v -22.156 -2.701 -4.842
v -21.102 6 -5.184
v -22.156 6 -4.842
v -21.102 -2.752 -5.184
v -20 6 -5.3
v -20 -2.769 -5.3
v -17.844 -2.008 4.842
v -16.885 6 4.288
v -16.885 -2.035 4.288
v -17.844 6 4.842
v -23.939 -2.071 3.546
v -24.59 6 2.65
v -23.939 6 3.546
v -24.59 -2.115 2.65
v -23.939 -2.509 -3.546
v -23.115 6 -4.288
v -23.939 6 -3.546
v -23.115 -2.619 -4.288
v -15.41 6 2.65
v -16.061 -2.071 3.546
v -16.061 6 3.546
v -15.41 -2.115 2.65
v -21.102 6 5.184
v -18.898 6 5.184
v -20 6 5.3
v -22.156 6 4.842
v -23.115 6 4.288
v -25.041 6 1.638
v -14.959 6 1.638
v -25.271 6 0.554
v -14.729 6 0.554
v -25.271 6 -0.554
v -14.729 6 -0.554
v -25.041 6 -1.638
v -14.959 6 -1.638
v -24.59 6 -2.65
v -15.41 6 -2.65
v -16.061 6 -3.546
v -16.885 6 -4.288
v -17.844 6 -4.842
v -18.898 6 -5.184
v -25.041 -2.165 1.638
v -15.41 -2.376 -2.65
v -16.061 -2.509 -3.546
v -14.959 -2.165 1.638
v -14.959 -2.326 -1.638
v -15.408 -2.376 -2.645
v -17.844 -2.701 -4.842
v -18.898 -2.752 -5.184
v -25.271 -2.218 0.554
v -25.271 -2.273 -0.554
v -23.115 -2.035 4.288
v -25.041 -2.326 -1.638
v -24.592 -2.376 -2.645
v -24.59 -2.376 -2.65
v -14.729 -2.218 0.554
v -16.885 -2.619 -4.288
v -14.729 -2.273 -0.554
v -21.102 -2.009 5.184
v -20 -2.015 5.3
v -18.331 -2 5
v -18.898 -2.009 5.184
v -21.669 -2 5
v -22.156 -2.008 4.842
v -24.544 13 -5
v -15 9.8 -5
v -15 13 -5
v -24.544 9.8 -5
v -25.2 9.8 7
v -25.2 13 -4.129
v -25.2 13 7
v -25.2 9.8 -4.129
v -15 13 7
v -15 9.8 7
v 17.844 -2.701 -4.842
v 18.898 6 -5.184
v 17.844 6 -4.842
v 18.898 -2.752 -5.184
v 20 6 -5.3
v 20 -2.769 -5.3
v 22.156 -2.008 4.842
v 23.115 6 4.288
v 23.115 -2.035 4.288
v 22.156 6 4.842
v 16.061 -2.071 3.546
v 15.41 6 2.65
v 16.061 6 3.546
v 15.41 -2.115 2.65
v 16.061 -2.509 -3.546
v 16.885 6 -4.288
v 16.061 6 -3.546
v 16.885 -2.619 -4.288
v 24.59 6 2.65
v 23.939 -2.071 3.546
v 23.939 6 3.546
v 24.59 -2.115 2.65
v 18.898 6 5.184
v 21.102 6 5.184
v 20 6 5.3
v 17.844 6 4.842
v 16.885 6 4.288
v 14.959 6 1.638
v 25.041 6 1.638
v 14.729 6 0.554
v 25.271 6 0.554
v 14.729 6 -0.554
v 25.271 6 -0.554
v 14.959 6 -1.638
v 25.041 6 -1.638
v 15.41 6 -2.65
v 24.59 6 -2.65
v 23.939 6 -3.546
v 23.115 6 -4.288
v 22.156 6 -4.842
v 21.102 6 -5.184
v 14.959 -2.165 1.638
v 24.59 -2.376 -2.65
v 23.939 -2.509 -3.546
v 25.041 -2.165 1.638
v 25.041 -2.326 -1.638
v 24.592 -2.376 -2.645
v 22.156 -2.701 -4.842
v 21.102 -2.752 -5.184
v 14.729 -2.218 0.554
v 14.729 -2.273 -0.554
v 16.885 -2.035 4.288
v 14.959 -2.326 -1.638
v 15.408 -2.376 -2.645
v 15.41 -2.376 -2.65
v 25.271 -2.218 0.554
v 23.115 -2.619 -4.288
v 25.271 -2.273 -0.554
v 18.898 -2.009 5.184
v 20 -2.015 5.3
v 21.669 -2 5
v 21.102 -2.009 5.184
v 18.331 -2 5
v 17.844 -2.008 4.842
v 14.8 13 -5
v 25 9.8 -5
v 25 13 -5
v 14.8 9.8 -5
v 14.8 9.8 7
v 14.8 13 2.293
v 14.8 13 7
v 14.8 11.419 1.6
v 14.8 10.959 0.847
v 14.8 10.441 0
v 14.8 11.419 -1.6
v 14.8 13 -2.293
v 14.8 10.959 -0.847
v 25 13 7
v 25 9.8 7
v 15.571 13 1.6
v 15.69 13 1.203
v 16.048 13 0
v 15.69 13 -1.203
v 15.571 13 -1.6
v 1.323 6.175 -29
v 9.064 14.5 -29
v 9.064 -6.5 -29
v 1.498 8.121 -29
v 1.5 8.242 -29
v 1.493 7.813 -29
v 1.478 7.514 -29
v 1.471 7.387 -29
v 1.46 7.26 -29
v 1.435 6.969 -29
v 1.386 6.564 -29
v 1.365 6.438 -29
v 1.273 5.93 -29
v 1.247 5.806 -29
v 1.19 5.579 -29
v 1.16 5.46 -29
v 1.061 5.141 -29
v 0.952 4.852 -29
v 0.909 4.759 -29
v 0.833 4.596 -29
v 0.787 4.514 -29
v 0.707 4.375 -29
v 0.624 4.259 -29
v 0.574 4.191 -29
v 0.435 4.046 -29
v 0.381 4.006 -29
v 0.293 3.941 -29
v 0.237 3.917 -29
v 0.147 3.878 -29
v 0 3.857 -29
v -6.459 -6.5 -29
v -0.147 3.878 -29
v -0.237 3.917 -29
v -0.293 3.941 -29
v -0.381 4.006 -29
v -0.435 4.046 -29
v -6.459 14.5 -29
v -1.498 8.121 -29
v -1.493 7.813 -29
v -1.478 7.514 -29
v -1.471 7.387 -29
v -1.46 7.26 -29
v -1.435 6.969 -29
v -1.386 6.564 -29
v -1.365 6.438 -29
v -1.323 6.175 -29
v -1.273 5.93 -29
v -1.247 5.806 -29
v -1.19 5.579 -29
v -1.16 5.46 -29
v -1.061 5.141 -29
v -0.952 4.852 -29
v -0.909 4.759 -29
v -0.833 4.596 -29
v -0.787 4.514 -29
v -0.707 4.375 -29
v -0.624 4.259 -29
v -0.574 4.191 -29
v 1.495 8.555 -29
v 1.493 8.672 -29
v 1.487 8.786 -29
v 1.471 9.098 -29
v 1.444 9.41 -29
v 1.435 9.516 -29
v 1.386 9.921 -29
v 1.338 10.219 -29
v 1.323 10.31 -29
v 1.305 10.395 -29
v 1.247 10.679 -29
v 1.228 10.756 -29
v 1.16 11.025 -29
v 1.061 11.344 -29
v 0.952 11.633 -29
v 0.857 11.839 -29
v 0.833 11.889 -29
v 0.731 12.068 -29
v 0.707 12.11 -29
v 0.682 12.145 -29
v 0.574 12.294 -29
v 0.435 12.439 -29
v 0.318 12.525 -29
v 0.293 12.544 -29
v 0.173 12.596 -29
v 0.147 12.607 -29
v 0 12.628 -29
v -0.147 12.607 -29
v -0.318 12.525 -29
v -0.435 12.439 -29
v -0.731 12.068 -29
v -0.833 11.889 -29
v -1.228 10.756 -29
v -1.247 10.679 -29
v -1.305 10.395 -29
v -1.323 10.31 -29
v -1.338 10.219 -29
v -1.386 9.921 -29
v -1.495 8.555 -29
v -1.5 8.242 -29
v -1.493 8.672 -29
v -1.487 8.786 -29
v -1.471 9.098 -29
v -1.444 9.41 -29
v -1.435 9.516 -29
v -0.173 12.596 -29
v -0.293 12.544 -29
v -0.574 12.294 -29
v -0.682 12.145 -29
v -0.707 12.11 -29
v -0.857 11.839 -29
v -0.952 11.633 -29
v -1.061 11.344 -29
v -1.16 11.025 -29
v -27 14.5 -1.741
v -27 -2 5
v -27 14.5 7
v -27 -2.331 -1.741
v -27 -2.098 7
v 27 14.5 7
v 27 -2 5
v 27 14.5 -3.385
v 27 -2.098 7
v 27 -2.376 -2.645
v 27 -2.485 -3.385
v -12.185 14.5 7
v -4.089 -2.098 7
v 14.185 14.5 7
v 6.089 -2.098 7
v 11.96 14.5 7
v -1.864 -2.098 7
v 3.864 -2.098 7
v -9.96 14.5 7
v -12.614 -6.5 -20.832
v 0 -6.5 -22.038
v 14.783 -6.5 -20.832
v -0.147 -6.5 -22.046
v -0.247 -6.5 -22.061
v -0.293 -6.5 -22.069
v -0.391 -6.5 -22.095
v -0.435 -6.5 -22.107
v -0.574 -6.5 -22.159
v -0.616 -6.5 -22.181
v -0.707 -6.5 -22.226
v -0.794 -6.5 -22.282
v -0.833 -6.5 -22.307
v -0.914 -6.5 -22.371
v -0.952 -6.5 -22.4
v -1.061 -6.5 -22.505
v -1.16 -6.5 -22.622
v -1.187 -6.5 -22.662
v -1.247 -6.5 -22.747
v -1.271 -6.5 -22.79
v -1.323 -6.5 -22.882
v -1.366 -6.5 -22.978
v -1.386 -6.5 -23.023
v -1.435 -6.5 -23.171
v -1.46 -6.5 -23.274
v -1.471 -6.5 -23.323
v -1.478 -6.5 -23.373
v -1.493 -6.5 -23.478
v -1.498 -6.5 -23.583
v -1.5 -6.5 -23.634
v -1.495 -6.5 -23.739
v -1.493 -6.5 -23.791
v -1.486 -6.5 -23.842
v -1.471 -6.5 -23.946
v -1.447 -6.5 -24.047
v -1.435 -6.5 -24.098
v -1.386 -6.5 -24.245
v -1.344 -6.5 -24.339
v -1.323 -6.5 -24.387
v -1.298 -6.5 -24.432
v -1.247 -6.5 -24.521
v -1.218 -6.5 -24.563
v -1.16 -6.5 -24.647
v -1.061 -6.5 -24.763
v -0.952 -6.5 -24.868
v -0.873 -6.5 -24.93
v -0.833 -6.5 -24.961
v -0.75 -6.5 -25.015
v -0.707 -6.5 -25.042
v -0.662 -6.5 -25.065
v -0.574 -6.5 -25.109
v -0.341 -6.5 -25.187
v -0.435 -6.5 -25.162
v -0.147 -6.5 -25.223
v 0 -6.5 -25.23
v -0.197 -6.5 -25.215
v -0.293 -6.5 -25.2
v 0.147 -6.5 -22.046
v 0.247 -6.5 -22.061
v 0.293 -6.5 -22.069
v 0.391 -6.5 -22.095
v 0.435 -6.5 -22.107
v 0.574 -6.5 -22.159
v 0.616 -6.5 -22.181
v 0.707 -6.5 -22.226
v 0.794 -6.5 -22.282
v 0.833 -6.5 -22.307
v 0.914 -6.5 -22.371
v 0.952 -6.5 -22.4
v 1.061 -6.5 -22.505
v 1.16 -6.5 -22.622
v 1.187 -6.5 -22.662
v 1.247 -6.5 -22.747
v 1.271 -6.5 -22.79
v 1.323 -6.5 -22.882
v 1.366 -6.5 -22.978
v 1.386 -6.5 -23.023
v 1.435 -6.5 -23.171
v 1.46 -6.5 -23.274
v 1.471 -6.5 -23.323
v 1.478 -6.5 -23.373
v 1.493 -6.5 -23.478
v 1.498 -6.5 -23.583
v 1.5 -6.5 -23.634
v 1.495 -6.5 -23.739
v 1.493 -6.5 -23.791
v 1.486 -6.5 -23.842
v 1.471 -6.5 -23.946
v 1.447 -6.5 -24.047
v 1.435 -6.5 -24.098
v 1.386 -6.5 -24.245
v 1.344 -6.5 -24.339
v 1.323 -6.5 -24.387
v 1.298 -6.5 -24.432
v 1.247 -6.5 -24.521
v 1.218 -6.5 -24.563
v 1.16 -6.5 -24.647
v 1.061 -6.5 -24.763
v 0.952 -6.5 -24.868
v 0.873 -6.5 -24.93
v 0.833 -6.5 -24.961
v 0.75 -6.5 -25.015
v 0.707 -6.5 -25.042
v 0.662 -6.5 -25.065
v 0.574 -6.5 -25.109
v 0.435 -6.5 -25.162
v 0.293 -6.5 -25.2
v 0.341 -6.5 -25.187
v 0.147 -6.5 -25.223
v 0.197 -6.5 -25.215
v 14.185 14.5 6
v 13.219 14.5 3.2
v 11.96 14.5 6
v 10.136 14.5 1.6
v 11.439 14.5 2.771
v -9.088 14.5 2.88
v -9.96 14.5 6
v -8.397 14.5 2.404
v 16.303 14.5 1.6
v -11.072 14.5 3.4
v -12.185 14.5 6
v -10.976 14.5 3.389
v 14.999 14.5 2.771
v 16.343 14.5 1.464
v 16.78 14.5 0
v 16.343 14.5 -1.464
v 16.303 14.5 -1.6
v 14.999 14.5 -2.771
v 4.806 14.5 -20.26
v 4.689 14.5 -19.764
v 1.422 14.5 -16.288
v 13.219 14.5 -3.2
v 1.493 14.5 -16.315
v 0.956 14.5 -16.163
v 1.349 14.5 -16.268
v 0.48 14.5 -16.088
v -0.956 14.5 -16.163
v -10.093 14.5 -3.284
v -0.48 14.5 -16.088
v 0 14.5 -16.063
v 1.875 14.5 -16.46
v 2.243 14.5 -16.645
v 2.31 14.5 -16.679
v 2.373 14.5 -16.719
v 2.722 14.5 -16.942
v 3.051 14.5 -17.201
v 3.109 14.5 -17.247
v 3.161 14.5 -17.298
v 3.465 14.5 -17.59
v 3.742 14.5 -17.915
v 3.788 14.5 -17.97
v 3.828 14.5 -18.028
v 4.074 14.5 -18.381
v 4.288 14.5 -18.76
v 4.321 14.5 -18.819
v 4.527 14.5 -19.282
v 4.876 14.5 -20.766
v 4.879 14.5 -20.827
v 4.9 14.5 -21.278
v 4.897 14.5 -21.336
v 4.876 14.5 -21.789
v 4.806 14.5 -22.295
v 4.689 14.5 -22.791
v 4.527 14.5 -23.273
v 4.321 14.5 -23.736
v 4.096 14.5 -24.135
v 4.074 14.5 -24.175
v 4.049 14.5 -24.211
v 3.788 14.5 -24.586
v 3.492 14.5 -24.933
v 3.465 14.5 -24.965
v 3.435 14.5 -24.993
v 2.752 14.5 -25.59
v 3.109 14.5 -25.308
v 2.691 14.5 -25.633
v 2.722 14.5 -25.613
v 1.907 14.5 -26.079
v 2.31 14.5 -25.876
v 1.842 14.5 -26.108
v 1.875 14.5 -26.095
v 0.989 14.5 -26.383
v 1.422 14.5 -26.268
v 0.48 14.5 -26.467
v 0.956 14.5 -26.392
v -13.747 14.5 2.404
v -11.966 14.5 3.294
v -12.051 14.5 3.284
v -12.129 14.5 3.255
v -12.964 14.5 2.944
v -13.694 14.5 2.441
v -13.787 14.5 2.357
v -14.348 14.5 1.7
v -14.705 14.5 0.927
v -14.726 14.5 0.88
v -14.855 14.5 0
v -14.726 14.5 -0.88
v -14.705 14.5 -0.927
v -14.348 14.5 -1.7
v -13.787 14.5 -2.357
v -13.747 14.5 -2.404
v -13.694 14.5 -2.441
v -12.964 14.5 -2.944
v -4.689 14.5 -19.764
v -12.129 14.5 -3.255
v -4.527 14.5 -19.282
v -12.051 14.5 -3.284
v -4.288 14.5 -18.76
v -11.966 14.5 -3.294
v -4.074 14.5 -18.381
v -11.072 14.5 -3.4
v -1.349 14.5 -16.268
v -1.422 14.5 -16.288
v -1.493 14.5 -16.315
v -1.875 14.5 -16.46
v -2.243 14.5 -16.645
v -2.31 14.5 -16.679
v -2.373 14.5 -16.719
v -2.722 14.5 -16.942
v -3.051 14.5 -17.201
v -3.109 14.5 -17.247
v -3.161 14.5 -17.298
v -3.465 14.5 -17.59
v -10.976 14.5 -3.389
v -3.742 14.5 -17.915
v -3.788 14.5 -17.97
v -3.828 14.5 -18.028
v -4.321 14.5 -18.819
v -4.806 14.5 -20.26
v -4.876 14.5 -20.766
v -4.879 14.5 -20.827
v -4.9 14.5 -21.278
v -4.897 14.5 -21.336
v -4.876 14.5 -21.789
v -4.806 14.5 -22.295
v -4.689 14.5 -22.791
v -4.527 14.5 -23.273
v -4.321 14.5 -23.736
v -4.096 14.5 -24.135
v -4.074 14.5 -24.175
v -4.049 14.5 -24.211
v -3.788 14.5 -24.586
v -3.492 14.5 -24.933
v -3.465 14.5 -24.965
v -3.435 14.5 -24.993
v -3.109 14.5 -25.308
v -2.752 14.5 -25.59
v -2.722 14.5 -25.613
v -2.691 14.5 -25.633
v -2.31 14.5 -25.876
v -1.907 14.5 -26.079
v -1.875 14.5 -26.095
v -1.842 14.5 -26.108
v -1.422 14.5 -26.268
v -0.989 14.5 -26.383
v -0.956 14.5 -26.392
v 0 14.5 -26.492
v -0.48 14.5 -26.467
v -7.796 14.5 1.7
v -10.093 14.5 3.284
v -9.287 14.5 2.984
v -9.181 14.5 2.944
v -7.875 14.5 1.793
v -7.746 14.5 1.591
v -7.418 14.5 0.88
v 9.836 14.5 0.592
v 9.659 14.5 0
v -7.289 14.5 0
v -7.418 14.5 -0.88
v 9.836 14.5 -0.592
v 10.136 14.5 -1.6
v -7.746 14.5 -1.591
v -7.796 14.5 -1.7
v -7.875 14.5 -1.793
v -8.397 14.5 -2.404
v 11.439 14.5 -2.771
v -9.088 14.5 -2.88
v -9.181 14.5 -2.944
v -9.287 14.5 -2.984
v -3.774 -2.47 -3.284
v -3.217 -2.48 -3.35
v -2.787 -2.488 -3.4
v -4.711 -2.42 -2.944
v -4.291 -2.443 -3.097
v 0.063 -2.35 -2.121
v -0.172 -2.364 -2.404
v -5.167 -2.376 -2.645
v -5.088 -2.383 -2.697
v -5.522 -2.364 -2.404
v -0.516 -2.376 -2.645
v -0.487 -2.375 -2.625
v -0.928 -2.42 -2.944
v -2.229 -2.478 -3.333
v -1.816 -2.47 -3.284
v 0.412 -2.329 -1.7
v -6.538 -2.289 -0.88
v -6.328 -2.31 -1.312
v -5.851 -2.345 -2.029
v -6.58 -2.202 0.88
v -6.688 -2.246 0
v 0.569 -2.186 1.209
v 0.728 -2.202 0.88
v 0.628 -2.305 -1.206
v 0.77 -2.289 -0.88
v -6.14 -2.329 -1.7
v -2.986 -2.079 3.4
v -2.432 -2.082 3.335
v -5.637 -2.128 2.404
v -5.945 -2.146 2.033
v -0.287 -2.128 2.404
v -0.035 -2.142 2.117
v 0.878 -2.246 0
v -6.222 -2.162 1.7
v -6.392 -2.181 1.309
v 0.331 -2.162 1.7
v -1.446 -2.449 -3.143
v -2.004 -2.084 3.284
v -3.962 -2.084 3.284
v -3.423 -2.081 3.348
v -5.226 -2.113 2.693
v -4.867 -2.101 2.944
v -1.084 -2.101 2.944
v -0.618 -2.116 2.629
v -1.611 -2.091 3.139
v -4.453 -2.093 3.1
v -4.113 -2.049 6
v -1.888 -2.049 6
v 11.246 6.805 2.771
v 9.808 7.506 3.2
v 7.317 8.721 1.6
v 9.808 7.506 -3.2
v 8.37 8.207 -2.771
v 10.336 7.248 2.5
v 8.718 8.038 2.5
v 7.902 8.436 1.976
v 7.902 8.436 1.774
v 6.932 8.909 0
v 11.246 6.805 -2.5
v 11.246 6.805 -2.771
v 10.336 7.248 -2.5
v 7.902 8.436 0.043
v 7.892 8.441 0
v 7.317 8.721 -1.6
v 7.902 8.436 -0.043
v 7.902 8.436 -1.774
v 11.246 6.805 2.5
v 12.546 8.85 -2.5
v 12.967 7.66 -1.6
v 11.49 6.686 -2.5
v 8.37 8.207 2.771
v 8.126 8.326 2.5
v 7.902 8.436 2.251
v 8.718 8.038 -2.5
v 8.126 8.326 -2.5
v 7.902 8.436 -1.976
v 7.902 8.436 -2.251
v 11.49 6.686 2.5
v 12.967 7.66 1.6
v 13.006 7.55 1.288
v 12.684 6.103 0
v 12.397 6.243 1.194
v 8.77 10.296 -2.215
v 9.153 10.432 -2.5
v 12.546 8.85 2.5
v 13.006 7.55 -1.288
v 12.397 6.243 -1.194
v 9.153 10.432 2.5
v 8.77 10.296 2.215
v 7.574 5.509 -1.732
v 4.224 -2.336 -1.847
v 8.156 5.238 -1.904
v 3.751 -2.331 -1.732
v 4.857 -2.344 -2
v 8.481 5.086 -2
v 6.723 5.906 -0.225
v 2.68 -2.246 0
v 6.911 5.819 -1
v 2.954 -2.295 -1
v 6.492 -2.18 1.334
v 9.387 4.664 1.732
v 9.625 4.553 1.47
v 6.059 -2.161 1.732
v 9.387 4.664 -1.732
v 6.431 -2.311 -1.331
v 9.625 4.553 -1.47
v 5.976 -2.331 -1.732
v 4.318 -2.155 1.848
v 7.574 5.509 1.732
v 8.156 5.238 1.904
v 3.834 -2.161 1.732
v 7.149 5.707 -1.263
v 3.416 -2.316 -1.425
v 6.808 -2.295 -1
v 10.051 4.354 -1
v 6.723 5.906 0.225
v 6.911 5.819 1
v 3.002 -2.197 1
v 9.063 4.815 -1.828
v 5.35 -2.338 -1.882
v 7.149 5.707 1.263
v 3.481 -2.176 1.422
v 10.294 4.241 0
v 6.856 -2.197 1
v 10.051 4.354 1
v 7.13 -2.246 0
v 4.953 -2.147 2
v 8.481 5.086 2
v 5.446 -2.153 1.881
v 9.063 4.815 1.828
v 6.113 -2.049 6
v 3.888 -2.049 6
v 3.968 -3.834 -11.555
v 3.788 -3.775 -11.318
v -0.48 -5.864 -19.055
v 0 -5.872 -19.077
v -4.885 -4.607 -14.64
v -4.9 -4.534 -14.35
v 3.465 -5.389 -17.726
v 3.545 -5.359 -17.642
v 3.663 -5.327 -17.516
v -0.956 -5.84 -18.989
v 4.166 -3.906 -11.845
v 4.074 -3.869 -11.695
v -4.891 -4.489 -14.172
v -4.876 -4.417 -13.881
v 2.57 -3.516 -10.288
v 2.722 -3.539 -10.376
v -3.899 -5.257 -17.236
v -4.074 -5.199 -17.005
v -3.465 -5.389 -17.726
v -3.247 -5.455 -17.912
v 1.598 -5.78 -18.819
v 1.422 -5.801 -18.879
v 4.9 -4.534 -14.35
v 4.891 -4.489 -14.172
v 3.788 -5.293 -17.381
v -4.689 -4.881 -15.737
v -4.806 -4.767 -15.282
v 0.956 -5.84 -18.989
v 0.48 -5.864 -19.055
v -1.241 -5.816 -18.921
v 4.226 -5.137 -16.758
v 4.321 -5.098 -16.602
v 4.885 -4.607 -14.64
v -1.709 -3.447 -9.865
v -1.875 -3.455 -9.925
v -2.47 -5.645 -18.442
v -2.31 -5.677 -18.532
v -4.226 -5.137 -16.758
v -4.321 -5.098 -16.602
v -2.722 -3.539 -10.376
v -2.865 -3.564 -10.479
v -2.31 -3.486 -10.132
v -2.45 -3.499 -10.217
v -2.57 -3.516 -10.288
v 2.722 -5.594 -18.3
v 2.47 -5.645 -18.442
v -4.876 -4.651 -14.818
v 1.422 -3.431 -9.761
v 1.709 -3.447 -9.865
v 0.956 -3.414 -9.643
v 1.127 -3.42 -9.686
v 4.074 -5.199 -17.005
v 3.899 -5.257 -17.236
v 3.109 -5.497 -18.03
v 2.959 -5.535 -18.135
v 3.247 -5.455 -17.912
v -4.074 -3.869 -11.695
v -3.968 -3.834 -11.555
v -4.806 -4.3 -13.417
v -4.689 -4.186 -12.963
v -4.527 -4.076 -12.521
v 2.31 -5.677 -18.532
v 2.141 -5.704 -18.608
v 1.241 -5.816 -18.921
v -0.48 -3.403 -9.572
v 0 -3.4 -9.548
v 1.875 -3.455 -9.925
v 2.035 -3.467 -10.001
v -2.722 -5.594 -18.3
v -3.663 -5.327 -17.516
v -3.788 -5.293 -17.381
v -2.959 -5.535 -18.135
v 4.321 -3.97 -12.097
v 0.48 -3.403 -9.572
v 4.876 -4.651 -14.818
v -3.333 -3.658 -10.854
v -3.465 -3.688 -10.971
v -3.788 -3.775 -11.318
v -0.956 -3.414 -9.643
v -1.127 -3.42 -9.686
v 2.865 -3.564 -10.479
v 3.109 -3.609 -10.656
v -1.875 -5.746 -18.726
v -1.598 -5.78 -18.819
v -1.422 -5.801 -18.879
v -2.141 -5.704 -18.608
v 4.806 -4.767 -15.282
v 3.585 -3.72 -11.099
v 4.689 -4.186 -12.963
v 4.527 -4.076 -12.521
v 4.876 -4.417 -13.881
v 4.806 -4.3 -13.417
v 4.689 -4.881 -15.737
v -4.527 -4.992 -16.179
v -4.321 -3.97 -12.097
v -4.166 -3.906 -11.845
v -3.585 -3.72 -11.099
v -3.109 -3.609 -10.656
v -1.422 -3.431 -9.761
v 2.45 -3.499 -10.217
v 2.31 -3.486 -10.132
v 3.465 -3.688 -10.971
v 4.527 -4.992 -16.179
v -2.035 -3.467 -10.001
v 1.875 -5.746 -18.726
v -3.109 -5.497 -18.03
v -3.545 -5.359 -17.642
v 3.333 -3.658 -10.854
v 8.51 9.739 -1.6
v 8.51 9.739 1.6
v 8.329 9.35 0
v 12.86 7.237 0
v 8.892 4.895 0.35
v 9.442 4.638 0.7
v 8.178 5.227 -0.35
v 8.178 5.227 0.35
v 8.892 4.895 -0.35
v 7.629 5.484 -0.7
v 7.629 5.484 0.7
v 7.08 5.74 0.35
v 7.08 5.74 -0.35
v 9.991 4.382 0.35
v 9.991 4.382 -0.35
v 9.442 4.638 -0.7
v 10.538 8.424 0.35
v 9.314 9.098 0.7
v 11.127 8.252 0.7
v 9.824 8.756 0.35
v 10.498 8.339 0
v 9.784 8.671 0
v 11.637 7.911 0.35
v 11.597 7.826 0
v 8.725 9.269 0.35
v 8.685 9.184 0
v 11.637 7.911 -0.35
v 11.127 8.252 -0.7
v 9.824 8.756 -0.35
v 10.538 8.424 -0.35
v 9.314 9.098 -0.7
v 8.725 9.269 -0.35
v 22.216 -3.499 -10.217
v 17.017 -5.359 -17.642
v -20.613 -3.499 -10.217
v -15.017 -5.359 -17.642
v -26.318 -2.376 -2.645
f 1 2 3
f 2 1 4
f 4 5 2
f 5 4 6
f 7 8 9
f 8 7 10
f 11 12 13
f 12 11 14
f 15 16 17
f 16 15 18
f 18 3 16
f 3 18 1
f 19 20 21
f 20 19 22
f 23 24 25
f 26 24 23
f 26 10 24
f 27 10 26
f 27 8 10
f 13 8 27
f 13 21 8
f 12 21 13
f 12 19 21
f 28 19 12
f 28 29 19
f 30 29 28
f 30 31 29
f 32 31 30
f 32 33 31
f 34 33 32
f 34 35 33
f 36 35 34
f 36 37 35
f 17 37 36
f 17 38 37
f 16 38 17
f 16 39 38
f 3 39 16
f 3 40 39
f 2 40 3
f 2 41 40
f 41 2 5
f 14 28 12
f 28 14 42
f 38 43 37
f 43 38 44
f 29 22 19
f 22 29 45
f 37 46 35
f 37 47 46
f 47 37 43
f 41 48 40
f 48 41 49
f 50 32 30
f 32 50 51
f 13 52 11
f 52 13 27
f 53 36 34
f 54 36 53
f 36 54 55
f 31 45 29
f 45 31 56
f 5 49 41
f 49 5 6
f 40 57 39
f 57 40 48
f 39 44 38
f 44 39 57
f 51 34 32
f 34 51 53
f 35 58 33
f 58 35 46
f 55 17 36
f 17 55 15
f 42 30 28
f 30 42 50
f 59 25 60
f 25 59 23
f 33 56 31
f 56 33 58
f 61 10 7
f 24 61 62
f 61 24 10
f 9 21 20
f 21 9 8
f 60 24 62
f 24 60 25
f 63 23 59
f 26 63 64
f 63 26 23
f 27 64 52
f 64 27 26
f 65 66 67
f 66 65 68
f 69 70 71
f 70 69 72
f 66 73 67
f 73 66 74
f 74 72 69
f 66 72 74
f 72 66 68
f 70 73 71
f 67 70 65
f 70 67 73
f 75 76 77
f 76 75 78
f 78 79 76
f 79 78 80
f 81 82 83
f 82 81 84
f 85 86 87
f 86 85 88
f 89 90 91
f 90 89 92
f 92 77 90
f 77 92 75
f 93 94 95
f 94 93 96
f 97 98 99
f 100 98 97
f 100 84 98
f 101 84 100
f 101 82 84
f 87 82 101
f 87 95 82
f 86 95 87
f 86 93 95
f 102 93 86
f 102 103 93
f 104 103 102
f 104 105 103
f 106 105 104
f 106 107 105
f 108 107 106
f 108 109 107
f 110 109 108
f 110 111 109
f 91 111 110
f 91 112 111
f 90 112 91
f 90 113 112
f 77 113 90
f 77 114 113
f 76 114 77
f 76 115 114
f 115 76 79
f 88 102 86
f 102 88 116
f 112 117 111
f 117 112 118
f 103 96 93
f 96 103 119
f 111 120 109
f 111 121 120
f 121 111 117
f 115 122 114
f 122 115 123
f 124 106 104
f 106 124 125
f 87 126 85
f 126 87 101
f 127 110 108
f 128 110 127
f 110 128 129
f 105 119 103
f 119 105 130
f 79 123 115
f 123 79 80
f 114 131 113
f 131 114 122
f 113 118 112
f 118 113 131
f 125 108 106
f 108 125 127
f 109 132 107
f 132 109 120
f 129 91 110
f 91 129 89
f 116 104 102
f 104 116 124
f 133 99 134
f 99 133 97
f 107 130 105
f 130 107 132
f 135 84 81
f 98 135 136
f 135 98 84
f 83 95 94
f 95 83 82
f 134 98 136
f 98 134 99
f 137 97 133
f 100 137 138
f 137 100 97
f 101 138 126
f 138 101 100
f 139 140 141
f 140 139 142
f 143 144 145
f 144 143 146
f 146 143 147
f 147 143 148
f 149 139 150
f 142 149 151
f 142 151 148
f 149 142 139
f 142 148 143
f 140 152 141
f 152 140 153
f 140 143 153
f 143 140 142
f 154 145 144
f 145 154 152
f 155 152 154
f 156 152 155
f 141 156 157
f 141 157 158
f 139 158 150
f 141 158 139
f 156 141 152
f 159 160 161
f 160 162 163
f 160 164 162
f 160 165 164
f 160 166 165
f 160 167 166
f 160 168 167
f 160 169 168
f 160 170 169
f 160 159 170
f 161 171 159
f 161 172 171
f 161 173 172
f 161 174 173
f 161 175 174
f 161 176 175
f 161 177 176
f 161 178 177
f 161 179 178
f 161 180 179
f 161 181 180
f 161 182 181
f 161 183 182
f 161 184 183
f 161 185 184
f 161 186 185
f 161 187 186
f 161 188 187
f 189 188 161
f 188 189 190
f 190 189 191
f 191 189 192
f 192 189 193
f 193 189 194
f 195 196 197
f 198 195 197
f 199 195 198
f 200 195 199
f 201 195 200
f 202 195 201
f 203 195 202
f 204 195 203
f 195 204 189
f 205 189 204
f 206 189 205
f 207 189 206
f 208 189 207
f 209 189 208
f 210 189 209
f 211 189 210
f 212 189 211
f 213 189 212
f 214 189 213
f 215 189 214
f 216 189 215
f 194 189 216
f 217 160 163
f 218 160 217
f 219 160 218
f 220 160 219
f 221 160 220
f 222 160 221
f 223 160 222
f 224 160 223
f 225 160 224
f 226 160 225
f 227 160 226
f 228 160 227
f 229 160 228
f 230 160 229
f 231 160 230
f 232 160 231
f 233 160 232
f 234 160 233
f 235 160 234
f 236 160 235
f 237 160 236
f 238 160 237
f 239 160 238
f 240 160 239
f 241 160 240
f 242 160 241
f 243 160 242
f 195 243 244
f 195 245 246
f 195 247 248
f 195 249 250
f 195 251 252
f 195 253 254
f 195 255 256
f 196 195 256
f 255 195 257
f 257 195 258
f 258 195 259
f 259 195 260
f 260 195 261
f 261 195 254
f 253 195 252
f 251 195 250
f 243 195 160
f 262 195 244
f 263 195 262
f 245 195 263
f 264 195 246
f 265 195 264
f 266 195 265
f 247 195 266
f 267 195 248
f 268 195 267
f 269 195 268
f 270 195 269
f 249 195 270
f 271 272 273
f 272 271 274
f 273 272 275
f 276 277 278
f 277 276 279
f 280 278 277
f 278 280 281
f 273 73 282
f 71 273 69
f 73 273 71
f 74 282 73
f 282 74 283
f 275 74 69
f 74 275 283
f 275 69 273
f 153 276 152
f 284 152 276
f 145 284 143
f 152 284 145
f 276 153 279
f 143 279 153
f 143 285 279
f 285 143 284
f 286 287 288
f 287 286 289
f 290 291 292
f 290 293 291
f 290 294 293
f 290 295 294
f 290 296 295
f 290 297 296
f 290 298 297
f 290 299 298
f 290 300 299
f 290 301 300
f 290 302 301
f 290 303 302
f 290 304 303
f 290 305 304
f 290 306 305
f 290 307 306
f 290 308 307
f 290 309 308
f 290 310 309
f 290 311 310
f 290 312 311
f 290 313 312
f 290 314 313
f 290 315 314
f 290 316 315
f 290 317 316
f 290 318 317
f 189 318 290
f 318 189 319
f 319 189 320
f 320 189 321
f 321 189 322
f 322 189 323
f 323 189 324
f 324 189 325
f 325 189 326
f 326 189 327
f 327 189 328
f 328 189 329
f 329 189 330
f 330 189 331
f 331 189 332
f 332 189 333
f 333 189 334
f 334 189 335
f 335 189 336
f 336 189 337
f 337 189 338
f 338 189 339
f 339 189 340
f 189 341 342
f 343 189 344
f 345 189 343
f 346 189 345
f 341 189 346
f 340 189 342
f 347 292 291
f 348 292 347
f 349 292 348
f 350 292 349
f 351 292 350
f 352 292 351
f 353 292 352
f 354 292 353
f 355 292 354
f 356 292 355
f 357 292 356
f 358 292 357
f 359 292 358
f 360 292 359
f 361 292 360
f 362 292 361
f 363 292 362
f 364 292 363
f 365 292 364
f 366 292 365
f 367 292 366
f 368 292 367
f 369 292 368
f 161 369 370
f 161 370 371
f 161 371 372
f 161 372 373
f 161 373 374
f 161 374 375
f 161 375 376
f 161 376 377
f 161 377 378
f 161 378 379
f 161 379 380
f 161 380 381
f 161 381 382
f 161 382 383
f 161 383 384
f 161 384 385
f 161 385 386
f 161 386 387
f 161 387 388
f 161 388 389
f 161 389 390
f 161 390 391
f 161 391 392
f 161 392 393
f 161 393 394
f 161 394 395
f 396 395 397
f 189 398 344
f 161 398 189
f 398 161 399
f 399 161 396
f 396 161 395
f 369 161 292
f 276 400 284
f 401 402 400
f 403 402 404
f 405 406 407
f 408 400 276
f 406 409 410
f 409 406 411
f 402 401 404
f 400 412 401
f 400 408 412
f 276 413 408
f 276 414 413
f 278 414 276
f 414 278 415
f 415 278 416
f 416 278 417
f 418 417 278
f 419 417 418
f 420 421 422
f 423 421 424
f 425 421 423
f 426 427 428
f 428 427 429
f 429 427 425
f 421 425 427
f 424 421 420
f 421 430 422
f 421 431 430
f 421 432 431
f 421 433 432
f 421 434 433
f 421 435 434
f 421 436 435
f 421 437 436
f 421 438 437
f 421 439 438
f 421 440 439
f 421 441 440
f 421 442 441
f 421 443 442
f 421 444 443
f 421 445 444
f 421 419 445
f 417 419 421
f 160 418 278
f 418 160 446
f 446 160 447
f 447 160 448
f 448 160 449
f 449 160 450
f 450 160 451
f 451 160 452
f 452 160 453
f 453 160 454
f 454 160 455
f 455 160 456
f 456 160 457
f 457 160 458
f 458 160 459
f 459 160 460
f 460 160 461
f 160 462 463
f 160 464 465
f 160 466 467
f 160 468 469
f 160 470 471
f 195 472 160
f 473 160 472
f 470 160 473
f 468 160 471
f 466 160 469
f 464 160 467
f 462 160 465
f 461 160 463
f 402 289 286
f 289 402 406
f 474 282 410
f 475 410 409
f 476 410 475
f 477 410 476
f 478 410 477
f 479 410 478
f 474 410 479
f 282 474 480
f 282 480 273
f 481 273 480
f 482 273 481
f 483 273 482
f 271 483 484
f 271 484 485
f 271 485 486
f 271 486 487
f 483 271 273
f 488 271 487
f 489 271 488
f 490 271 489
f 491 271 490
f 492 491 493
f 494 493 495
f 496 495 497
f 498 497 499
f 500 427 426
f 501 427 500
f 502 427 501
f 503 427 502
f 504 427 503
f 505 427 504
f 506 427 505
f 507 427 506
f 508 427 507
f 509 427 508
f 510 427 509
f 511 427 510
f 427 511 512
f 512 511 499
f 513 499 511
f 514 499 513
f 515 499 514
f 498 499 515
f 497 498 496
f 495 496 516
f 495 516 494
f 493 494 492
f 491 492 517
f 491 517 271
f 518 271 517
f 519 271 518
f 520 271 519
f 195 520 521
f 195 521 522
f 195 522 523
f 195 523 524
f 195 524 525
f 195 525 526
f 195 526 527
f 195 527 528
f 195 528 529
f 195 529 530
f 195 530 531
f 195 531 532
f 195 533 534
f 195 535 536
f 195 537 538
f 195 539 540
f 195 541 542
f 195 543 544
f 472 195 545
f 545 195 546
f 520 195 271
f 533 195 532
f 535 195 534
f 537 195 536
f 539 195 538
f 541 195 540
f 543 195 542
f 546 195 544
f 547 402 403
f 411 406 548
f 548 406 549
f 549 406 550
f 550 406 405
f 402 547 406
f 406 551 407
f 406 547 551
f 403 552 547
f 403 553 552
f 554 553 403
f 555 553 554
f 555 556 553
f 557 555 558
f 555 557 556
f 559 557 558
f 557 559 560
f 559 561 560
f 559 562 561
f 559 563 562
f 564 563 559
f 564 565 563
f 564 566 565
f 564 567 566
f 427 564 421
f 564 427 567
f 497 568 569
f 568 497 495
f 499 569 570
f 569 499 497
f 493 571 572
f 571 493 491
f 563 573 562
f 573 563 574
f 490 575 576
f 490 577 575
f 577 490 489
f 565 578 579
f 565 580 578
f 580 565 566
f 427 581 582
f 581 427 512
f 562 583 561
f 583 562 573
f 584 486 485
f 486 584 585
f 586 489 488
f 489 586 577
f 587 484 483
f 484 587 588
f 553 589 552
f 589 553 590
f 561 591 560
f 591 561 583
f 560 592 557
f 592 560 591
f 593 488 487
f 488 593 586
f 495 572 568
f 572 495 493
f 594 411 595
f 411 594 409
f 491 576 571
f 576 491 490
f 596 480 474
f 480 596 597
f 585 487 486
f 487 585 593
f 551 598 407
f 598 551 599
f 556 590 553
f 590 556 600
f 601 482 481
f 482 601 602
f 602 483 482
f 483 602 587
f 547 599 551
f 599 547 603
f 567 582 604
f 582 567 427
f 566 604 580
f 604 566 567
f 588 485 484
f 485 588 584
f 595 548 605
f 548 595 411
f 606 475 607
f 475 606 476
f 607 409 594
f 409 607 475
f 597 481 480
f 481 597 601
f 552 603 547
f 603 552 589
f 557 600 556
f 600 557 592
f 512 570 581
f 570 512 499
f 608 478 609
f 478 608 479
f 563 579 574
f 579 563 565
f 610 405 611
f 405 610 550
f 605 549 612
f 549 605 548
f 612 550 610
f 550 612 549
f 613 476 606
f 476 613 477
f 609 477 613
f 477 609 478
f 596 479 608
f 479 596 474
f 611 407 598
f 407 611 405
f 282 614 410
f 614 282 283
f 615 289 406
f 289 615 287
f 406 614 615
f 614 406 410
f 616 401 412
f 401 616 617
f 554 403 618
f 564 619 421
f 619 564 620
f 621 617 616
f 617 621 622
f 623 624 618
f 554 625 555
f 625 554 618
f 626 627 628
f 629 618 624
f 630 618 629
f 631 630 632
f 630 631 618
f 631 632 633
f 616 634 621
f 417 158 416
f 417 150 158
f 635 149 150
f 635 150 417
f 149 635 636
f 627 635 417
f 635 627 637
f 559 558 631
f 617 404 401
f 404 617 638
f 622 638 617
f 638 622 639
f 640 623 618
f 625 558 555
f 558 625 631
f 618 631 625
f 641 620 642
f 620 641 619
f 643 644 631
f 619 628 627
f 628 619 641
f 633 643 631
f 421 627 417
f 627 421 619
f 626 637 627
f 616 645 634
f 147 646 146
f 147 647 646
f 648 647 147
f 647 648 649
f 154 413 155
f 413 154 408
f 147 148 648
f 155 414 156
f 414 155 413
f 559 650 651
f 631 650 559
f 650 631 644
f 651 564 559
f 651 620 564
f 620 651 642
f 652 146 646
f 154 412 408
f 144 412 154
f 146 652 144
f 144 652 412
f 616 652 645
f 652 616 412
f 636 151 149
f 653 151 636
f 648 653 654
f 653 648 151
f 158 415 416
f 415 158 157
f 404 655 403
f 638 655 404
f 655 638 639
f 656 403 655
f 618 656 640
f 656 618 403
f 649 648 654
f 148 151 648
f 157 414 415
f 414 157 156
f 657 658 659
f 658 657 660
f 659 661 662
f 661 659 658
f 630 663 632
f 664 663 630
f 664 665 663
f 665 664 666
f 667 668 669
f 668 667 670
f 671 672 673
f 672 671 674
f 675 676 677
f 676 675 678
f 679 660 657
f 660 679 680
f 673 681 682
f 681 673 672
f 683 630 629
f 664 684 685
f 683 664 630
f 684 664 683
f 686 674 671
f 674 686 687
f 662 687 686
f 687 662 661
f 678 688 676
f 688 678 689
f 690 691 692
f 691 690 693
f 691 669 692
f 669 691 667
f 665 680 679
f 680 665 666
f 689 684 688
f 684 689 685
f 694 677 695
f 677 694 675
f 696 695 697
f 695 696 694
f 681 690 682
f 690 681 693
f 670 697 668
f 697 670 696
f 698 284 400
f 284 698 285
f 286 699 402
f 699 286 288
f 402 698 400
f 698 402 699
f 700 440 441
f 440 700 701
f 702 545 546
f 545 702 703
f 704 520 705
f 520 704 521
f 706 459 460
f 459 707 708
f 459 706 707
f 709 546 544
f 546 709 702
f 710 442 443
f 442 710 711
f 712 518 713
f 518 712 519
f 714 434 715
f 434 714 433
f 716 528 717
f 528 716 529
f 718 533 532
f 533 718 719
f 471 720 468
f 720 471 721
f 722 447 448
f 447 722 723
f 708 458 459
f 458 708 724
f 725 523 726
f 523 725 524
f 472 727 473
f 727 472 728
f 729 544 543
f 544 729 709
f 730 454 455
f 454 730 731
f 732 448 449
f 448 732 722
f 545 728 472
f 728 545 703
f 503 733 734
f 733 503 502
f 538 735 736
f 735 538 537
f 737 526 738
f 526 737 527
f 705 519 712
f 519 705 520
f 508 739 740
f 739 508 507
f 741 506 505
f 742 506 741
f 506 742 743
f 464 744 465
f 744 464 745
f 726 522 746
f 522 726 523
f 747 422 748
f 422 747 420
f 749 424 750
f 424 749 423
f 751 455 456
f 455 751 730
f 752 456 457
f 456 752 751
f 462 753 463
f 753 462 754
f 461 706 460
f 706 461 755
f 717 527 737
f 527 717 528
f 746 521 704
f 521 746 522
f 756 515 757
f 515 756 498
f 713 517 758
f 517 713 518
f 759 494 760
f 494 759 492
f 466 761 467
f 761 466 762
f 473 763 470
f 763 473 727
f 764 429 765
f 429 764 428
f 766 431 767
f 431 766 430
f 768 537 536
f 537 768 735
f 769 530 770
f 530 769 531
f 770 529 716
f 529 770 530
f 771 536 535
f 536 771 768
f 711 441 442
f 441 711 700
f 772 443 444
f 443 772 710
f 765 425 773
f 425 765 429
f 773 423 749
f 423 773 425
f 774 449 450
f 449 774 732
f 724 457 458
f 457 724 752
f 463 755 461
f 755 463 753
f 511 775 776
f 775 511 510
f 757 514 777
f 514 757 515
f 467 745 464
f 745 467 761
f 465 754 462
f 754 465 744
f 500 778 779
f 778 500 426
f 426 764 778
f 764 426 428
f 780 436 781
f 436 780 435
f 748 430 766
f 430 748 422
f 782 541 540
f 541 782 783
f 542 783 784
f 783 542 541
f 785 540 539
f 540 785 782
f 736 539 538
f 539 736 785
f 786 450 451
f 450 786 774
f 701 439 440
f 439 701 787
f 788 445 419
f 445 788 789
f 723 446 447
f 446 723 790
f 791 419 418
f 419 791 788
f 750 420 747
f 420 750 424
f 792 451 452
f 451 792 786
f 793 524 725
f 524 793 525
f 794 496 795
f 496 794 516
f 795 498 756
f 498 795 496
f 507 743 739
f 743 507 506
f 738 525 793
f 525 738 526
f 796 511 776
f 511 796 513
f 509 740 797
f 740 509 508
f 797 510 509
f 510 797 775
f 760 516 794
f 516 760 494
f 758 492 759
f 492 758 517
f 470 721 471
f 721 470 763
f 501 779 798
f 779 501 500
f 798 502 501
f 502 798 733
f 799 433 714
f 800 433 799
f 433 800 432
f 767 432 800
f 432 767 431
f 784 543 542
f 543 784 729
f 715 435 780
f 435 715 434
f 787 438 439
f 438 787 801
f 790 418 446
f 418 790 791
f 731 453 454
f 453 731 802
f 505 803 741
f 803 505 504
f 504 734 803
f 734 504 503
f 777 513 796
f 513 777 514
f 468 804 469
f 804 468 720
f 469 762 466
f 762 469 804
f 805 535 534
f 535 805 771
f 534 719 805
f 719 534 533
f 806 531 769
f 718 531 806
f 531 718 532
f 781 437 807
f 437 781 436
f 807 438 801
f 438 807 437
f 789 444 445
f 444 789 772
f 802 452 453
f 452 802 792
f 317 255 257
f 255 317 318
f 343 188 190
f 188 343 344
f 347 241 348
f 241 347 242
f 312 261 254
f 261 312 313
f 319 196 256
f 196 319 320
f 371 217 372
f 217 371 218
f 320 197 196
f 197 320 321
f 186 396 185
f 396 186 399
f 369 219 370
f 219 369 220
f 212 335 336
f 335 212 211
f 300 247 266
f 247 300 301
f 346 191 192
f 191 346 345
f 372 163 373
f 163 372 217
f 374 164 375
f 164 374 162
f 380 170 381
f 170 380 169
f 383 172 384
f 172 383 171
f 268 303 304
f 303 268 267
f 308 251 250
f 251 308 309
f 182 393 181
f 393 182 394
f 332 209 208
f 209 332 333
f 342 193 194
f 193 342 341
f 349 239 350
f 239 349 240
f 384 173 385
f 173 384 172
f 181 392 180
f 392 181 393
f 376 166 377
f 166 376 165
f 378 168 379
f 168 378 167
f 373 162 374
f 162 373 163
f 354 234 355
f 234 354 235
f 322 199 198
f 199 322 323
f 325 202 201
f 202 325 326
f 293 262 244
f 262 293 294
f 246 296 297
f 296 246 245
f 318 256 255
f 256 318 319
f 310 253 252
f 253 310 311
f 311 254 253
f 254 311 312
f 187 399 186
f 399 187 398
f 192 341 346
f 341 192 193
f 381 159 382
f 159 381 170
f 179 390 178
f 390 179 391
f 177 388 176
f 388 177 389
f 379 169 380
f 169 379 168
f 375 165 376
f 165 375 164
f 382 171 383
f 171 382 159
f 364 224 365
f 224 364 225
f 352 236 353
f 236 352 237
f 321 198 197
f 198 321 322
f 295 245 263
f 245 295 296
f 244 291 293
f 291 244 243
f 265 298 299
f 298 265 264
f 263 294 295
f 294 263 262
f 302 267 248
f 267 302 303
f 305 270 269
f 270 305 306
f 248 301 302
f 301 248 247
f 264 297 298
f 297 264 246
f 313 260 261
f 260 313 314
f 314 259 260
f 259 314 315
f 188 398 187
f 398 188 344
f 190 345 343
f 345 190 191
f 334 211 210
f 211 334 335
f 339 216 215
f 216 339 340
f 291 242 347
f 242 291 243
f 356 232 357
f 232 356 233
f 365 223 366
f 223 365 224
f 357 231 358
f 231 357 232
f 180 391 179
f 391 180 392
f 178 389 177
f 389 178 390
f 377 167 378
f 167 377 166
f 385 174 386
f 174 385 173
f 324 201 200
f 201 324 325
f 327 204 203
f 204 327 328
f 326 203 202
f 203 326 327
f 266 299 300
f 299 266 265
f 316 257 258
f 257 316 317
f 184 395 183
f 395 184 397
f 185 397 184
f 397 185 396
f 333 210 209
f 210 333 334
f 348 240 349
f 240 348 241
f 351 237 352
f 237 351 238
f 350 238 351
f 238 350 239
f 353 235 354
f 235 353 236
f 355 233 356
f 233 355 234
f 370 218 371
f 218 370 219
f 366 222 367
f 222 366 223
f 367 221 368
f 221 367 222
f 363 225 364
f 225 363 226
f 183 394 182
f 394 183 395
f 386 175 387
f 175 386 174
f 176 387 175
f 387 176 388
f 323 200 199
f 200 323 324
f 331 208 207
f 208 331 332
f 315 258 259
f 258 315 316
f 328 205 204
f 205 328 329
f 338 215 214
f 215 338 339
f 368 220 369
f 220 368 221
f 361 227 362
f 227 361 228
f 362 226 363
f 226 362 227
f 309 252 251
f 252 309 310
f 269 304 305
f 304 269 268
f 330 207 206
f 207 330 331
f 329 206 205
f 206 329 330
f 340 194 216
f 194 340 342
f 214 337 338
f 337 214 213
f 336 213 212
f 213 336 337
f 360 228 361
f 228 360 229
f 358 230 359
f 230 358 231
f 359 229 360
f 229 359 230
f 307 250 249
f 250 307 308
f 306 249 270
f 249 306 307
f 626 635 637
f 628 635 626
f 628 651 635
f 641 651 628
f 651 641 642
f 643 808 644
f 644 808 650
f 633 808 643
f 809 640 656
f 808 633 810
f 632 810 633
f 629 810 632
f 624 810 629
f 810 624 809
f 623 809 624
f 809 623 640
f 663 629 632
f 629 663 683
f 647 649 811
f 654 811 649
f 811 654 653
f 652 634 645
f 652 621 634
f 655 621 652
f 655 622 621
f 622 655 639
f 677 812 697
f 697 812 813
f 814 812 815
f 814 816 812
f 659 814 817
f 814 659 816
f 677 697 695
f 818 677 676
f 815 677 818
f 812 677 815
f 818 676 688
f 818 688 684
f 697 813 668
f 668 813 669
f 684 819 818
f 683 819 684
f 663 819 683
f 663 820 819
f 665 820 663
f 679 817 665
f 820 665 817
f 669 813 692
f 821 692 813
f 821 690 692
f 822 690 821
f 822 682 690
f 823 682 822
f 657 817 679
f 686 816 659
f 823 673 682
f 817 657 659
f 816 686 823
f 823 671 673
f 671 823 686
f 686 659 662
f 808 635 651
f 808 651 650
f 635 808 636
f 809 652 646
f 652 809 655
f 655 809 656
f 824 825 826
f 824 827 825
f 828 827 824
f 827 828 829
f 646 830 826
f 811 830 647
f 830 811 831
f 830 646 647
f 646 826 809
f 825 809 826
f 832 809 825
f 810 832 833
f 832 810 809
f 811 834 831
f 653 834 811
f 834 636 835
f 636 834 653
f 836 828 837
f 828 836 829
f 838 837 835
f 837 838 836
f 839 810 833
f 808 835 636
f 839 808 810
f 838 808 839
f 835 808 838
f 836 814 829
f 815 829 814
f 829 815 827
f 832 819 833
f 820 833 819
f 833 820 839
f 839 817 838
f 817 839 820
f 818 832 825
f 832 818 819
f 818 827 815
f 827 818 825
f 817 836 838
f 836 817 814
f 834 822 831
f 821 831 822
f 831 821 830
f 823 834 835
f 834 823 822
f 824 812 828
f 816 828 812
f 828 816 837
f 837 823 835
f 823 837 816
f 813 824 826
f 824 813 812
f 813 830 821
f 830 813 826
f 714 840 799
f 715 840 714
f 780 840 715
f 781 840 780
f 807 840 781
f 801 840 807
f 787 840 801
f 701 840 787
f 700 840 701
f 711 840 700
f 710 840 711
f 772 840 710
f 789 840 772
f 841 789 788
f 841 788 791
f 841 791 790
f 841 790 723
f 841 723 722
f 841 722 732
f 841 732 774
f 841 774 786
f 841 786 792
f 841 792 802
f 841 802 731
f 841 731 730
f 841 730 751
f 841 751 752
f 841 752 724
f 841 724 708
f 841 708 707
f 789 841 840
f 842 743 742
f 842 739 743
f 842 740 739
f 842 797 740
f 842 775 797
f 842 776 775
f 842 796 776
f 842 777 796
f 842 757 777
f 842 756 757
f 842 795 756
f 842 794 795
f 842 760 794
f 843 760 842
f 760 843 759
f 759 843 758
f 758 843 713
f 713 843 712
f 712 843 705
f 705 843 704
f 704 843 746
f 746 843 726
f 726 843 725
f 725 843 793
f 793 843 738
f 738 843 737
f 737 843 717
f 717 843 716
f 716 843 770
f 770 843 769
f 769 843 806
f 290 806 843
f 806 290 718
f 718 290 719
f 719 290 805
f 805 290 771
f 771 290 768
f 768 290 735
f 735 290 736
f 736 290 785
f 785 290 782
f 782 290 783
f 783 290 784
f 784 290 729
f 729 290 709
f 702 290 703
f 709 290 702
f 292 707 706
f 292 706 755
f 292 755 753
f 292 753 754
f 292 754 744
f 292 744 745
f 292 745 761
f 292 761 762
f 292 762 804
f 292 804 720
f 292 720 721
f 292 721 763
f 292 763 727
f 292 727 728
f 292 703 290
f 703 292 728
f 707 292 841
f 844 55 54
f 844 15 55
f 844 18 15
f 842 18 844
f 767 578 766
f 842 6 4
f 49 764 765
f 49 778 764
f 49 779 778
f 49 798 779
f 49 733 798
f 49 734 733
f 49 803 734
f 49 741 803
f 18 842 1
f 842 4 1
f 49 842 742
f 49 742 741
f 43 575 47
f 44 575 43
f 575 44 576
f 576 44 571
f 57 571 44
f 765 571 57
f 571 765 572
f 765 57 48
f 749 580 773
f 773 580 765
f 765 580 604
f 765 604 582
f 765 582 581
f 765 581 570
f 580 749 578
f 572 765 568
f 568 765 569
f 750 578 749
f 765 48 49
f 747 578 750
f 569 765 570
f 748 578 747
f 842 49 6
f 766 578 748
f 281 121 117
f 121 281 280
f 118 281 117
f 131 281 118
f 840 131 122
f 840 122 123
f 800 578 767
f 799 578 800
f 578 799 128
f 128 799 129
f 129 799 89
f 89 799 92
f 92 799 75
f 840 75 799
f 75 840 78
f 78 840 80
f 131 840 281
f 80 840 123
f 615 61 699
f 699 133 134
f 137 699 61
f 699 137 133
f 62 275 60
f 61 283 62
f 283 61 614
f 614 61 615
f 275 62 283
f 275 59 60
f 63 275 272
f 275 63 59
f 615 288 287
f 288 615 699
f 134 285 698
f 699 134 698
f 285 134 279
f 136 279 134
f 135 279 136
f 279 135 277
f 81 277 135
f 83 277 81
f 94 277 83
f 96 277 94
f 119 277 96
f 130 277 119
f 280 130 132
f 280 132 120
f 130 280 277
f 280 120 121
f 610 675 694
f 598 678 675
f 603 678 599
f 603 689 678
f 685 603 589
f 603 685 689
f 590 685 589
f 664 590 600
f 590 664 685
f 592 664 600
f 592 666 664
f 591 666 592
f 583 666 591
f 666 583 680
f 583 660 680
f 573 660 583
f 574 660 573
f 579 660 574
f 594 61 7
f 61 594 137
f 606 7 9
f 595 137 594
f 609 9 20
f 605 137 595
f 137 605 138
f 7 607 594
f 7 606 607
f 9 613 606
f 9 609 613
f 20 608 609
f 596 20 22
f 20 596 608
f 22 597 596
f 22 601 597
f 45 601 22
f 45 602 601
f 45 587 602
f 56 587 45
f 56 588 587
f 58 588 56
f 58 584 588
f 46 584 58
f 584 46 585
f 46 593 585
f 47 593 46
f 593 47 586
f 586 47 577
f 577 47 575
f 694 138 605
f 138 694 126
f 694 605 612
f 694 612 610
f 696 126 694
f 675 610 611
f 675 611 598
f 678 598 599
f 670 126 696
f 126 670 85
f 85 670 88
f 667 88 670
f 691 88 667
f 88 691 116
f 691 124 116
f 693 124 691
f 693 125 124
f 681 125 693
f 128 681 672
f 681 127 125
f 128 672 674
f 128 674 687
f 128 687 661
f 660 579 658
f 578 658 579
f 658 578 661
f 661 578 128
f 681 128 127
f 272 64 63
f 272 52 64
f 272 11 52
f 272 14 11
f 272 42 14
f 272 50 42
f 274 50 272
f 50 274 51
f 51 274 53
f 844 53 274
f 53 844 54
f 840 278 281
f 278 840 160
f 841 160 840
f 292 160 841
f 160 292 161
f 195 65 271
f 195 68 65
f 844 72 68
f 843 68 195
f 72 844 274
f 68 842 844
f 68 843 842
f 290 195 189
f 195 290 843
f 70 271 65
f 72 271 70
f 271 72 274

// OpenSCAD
diameter=10;
height=4;
number=3;
distance=5;
baseline=36; 


module maghole(diameter,height,number,back) {
		translate([0,height*(number-2)/2,0])
        rotate([90,0,0])
         cylinder(r=diameter/2,h=height*(2*number-1),center=true);
    if(back == 1) {
		translate([0,-height*2*(number+1)/2,0])
        rotate([90,0,0])
         cylinder(r=diameter/6,h=height*number,center=true);
    }
}

module smaghole(diameter,height,number,back) {
		translate([0,(height*(number-2)/2),0])
        rotate([90,0,0])
         cylinder(r=0.3+diameter/2,h=height*4,center=true,$fs = 0.01);
//         cylinder(r=0.3+diameter/2,h=height*(2*number-1),center=true);

    translate([-9,-13,-5]) cube([4+diameter,3.2,diameter+0.2]);    
   // translate([-1,-15,0]) cube([3,3,10]);
}
module mirror(diameter,height,number,distance,baseline) {
width=diameter+4;
depth=distance+height*number+4;
length=baseline+diameter+8;
mirrorthick = 2.7;
   difference() {
     translate([0,-height,0])
	   cube([width,  // Small dimension
            depth, // Optical path dim
		      length],center=true);
      translate([0,0,2+baseline/2])
             maghole(diameter,height,number,0);
     translate([0,0,-(2+baseline/2)])
             maghole(diameter,height,number,0);
     translate([0,depth/4,0])
          cube([width+2,depth+2,length-2*width],center=true);
    rotate([7,0,0])
     translate([0,0.6-depth/3,0.75])
          cube([width+2,mirrorthick+0.6,length-(2*diameter+4)],center=true);
     }
}

module sensor(diameter,height,number,distance,baseline) {
width=diameter+4;
depth=distance+height*number+4;
length=baseline+diameter+8;
mirrorthick = 2.6;
//extra=2*width+4;
extra=2*width+8;

   difference() {
//     translate([2+width/2,-height,0])
     translate([4+width/2,-height,0])
	   cube([extra,  // Small dimension
            depth, // Optical path dim
		      length],center=true);
      translate([0,0,2+baseline/2])
             smaghole(diameter,height,number,1);
     translate([0,0,-(2+baseline/2)])
             smaghole(diameter,height,number,1);
//LASER
     translate([0,0,4])
        rotate([64,0,0])
             cylinder(r=3.4,h=40,center=true,$fn=24);
     translate([-11,0,4])
        rotate([64,0,0]) cube([10,2,40],center=true);
//PhotoTransistor
     translate([0,-12,-12])
        rotate([116,0,0])
             cylinder(r=3.2,h=10,center=true,$fn=12);
     translate([0,0,-6])
        rotate([116,0,0])
             cylinder(r=2,h=40,center=true,$fn=12);
     translate([-11,0,-6])
        rotate([116,0,0]) cube([10,2,40],center=true);
//TEMP SENSOR
     translate([2+width,0,0])
        rotate([90,0,20])
             cylinder(r=4.9,h=40,center=true,$fn=64);
//SET SCREW
     translate([12+width,0,0])
        rotate([90,0,20])
             cylinder(r=1.5,h=40,center=true,$fn=64);
     }
translate([0,-5,-6.3])
rotate([25,0,0])
     difference() {
     translate([0,-4,-2.5])cube([5,6,5],center=true);
     translate([0,-8,0])
        cylinder(r=3.2,h=10,center=true,$fn=12);
     translate([0,0,-1.0])
        rotate([90,0,0])
             cylinder(r=0.7,h=40,center=true,$fn=6);
     translate([0,0,-3])
        rotate([90,0,0])
             cylinder(r=0.7,h=40,center=true,$fn=6);
     }
}

module jarwall() {
  difference() {
     cube([40,40,120],center=true);
	  translate([40,0,0])
	     cylinder(r=50,h=120,center=true,$fn=64);
	   }
}

module jar() {
	  translate([-8,110,-10])
	          cylinder(r=78,h=120,center=true,$fn=64);
}

module powerhole(dim) {
offset = dim+2;
  //  cylinder(r=dim,h=2*dim,center=true,$fn=10);
  //  translate([dim-1.6,0,0])
   //   cylinder(r=dim,h=dim,center=true,$fn=10);
    translate([dim-3,0,0]) cube([2*dim+2,2*dim-1,2*dim-1],center=true);
    translate([-offset,0,0])
      cylinder(r=1.1,h=2*dim,center=true,$fn=10);
    translate([offset+2,0,0])
      cylinder(r=1.1,h=2*dim,center=true,$fn=10);
}

module sensordevice() {
  wall = 32;
  side = 44;
  deep = 50;
  difference() { 
   sensor(diameter,height,number,distance,baseline);
   translate([3,-30,3]) jar();
  }
//  translate([-7,-(wall+30),21]) cube([wall,side+12,3]);

//     translate([-7,-(wall+30),-24])
//         cube([wall,side+12,3]);

//  difference() {
//  translate([23.5,-(wall+7),0])
//    rotate([0,90,0])
//    cube([side,deep,3],center=true);
//     translate([24,-54,12])
//			rotate([0,90,0]) 
//           powerhole(4.5);
//  }
}
module mirrordevice() {
  difference() { 
   mirror(diameter,height,number,distance,baseline);
   translate([0,-3.3,0]) rotate([0,0,-90]) jarwall();
  }
}
  // mirrordevice();

module minimum() {
 difference() {
    rotate([0,90,180]) 
           sensordevice();
   translate([34,0,-30])
     rotate([0,35,0])
      cube([42,42,42],center=true);
   translate([-32,0,-30])
     rotate([0,-37,0])
      cube([42,42,42],center=true);
  }
}
//jarwall();
minimum();



     
